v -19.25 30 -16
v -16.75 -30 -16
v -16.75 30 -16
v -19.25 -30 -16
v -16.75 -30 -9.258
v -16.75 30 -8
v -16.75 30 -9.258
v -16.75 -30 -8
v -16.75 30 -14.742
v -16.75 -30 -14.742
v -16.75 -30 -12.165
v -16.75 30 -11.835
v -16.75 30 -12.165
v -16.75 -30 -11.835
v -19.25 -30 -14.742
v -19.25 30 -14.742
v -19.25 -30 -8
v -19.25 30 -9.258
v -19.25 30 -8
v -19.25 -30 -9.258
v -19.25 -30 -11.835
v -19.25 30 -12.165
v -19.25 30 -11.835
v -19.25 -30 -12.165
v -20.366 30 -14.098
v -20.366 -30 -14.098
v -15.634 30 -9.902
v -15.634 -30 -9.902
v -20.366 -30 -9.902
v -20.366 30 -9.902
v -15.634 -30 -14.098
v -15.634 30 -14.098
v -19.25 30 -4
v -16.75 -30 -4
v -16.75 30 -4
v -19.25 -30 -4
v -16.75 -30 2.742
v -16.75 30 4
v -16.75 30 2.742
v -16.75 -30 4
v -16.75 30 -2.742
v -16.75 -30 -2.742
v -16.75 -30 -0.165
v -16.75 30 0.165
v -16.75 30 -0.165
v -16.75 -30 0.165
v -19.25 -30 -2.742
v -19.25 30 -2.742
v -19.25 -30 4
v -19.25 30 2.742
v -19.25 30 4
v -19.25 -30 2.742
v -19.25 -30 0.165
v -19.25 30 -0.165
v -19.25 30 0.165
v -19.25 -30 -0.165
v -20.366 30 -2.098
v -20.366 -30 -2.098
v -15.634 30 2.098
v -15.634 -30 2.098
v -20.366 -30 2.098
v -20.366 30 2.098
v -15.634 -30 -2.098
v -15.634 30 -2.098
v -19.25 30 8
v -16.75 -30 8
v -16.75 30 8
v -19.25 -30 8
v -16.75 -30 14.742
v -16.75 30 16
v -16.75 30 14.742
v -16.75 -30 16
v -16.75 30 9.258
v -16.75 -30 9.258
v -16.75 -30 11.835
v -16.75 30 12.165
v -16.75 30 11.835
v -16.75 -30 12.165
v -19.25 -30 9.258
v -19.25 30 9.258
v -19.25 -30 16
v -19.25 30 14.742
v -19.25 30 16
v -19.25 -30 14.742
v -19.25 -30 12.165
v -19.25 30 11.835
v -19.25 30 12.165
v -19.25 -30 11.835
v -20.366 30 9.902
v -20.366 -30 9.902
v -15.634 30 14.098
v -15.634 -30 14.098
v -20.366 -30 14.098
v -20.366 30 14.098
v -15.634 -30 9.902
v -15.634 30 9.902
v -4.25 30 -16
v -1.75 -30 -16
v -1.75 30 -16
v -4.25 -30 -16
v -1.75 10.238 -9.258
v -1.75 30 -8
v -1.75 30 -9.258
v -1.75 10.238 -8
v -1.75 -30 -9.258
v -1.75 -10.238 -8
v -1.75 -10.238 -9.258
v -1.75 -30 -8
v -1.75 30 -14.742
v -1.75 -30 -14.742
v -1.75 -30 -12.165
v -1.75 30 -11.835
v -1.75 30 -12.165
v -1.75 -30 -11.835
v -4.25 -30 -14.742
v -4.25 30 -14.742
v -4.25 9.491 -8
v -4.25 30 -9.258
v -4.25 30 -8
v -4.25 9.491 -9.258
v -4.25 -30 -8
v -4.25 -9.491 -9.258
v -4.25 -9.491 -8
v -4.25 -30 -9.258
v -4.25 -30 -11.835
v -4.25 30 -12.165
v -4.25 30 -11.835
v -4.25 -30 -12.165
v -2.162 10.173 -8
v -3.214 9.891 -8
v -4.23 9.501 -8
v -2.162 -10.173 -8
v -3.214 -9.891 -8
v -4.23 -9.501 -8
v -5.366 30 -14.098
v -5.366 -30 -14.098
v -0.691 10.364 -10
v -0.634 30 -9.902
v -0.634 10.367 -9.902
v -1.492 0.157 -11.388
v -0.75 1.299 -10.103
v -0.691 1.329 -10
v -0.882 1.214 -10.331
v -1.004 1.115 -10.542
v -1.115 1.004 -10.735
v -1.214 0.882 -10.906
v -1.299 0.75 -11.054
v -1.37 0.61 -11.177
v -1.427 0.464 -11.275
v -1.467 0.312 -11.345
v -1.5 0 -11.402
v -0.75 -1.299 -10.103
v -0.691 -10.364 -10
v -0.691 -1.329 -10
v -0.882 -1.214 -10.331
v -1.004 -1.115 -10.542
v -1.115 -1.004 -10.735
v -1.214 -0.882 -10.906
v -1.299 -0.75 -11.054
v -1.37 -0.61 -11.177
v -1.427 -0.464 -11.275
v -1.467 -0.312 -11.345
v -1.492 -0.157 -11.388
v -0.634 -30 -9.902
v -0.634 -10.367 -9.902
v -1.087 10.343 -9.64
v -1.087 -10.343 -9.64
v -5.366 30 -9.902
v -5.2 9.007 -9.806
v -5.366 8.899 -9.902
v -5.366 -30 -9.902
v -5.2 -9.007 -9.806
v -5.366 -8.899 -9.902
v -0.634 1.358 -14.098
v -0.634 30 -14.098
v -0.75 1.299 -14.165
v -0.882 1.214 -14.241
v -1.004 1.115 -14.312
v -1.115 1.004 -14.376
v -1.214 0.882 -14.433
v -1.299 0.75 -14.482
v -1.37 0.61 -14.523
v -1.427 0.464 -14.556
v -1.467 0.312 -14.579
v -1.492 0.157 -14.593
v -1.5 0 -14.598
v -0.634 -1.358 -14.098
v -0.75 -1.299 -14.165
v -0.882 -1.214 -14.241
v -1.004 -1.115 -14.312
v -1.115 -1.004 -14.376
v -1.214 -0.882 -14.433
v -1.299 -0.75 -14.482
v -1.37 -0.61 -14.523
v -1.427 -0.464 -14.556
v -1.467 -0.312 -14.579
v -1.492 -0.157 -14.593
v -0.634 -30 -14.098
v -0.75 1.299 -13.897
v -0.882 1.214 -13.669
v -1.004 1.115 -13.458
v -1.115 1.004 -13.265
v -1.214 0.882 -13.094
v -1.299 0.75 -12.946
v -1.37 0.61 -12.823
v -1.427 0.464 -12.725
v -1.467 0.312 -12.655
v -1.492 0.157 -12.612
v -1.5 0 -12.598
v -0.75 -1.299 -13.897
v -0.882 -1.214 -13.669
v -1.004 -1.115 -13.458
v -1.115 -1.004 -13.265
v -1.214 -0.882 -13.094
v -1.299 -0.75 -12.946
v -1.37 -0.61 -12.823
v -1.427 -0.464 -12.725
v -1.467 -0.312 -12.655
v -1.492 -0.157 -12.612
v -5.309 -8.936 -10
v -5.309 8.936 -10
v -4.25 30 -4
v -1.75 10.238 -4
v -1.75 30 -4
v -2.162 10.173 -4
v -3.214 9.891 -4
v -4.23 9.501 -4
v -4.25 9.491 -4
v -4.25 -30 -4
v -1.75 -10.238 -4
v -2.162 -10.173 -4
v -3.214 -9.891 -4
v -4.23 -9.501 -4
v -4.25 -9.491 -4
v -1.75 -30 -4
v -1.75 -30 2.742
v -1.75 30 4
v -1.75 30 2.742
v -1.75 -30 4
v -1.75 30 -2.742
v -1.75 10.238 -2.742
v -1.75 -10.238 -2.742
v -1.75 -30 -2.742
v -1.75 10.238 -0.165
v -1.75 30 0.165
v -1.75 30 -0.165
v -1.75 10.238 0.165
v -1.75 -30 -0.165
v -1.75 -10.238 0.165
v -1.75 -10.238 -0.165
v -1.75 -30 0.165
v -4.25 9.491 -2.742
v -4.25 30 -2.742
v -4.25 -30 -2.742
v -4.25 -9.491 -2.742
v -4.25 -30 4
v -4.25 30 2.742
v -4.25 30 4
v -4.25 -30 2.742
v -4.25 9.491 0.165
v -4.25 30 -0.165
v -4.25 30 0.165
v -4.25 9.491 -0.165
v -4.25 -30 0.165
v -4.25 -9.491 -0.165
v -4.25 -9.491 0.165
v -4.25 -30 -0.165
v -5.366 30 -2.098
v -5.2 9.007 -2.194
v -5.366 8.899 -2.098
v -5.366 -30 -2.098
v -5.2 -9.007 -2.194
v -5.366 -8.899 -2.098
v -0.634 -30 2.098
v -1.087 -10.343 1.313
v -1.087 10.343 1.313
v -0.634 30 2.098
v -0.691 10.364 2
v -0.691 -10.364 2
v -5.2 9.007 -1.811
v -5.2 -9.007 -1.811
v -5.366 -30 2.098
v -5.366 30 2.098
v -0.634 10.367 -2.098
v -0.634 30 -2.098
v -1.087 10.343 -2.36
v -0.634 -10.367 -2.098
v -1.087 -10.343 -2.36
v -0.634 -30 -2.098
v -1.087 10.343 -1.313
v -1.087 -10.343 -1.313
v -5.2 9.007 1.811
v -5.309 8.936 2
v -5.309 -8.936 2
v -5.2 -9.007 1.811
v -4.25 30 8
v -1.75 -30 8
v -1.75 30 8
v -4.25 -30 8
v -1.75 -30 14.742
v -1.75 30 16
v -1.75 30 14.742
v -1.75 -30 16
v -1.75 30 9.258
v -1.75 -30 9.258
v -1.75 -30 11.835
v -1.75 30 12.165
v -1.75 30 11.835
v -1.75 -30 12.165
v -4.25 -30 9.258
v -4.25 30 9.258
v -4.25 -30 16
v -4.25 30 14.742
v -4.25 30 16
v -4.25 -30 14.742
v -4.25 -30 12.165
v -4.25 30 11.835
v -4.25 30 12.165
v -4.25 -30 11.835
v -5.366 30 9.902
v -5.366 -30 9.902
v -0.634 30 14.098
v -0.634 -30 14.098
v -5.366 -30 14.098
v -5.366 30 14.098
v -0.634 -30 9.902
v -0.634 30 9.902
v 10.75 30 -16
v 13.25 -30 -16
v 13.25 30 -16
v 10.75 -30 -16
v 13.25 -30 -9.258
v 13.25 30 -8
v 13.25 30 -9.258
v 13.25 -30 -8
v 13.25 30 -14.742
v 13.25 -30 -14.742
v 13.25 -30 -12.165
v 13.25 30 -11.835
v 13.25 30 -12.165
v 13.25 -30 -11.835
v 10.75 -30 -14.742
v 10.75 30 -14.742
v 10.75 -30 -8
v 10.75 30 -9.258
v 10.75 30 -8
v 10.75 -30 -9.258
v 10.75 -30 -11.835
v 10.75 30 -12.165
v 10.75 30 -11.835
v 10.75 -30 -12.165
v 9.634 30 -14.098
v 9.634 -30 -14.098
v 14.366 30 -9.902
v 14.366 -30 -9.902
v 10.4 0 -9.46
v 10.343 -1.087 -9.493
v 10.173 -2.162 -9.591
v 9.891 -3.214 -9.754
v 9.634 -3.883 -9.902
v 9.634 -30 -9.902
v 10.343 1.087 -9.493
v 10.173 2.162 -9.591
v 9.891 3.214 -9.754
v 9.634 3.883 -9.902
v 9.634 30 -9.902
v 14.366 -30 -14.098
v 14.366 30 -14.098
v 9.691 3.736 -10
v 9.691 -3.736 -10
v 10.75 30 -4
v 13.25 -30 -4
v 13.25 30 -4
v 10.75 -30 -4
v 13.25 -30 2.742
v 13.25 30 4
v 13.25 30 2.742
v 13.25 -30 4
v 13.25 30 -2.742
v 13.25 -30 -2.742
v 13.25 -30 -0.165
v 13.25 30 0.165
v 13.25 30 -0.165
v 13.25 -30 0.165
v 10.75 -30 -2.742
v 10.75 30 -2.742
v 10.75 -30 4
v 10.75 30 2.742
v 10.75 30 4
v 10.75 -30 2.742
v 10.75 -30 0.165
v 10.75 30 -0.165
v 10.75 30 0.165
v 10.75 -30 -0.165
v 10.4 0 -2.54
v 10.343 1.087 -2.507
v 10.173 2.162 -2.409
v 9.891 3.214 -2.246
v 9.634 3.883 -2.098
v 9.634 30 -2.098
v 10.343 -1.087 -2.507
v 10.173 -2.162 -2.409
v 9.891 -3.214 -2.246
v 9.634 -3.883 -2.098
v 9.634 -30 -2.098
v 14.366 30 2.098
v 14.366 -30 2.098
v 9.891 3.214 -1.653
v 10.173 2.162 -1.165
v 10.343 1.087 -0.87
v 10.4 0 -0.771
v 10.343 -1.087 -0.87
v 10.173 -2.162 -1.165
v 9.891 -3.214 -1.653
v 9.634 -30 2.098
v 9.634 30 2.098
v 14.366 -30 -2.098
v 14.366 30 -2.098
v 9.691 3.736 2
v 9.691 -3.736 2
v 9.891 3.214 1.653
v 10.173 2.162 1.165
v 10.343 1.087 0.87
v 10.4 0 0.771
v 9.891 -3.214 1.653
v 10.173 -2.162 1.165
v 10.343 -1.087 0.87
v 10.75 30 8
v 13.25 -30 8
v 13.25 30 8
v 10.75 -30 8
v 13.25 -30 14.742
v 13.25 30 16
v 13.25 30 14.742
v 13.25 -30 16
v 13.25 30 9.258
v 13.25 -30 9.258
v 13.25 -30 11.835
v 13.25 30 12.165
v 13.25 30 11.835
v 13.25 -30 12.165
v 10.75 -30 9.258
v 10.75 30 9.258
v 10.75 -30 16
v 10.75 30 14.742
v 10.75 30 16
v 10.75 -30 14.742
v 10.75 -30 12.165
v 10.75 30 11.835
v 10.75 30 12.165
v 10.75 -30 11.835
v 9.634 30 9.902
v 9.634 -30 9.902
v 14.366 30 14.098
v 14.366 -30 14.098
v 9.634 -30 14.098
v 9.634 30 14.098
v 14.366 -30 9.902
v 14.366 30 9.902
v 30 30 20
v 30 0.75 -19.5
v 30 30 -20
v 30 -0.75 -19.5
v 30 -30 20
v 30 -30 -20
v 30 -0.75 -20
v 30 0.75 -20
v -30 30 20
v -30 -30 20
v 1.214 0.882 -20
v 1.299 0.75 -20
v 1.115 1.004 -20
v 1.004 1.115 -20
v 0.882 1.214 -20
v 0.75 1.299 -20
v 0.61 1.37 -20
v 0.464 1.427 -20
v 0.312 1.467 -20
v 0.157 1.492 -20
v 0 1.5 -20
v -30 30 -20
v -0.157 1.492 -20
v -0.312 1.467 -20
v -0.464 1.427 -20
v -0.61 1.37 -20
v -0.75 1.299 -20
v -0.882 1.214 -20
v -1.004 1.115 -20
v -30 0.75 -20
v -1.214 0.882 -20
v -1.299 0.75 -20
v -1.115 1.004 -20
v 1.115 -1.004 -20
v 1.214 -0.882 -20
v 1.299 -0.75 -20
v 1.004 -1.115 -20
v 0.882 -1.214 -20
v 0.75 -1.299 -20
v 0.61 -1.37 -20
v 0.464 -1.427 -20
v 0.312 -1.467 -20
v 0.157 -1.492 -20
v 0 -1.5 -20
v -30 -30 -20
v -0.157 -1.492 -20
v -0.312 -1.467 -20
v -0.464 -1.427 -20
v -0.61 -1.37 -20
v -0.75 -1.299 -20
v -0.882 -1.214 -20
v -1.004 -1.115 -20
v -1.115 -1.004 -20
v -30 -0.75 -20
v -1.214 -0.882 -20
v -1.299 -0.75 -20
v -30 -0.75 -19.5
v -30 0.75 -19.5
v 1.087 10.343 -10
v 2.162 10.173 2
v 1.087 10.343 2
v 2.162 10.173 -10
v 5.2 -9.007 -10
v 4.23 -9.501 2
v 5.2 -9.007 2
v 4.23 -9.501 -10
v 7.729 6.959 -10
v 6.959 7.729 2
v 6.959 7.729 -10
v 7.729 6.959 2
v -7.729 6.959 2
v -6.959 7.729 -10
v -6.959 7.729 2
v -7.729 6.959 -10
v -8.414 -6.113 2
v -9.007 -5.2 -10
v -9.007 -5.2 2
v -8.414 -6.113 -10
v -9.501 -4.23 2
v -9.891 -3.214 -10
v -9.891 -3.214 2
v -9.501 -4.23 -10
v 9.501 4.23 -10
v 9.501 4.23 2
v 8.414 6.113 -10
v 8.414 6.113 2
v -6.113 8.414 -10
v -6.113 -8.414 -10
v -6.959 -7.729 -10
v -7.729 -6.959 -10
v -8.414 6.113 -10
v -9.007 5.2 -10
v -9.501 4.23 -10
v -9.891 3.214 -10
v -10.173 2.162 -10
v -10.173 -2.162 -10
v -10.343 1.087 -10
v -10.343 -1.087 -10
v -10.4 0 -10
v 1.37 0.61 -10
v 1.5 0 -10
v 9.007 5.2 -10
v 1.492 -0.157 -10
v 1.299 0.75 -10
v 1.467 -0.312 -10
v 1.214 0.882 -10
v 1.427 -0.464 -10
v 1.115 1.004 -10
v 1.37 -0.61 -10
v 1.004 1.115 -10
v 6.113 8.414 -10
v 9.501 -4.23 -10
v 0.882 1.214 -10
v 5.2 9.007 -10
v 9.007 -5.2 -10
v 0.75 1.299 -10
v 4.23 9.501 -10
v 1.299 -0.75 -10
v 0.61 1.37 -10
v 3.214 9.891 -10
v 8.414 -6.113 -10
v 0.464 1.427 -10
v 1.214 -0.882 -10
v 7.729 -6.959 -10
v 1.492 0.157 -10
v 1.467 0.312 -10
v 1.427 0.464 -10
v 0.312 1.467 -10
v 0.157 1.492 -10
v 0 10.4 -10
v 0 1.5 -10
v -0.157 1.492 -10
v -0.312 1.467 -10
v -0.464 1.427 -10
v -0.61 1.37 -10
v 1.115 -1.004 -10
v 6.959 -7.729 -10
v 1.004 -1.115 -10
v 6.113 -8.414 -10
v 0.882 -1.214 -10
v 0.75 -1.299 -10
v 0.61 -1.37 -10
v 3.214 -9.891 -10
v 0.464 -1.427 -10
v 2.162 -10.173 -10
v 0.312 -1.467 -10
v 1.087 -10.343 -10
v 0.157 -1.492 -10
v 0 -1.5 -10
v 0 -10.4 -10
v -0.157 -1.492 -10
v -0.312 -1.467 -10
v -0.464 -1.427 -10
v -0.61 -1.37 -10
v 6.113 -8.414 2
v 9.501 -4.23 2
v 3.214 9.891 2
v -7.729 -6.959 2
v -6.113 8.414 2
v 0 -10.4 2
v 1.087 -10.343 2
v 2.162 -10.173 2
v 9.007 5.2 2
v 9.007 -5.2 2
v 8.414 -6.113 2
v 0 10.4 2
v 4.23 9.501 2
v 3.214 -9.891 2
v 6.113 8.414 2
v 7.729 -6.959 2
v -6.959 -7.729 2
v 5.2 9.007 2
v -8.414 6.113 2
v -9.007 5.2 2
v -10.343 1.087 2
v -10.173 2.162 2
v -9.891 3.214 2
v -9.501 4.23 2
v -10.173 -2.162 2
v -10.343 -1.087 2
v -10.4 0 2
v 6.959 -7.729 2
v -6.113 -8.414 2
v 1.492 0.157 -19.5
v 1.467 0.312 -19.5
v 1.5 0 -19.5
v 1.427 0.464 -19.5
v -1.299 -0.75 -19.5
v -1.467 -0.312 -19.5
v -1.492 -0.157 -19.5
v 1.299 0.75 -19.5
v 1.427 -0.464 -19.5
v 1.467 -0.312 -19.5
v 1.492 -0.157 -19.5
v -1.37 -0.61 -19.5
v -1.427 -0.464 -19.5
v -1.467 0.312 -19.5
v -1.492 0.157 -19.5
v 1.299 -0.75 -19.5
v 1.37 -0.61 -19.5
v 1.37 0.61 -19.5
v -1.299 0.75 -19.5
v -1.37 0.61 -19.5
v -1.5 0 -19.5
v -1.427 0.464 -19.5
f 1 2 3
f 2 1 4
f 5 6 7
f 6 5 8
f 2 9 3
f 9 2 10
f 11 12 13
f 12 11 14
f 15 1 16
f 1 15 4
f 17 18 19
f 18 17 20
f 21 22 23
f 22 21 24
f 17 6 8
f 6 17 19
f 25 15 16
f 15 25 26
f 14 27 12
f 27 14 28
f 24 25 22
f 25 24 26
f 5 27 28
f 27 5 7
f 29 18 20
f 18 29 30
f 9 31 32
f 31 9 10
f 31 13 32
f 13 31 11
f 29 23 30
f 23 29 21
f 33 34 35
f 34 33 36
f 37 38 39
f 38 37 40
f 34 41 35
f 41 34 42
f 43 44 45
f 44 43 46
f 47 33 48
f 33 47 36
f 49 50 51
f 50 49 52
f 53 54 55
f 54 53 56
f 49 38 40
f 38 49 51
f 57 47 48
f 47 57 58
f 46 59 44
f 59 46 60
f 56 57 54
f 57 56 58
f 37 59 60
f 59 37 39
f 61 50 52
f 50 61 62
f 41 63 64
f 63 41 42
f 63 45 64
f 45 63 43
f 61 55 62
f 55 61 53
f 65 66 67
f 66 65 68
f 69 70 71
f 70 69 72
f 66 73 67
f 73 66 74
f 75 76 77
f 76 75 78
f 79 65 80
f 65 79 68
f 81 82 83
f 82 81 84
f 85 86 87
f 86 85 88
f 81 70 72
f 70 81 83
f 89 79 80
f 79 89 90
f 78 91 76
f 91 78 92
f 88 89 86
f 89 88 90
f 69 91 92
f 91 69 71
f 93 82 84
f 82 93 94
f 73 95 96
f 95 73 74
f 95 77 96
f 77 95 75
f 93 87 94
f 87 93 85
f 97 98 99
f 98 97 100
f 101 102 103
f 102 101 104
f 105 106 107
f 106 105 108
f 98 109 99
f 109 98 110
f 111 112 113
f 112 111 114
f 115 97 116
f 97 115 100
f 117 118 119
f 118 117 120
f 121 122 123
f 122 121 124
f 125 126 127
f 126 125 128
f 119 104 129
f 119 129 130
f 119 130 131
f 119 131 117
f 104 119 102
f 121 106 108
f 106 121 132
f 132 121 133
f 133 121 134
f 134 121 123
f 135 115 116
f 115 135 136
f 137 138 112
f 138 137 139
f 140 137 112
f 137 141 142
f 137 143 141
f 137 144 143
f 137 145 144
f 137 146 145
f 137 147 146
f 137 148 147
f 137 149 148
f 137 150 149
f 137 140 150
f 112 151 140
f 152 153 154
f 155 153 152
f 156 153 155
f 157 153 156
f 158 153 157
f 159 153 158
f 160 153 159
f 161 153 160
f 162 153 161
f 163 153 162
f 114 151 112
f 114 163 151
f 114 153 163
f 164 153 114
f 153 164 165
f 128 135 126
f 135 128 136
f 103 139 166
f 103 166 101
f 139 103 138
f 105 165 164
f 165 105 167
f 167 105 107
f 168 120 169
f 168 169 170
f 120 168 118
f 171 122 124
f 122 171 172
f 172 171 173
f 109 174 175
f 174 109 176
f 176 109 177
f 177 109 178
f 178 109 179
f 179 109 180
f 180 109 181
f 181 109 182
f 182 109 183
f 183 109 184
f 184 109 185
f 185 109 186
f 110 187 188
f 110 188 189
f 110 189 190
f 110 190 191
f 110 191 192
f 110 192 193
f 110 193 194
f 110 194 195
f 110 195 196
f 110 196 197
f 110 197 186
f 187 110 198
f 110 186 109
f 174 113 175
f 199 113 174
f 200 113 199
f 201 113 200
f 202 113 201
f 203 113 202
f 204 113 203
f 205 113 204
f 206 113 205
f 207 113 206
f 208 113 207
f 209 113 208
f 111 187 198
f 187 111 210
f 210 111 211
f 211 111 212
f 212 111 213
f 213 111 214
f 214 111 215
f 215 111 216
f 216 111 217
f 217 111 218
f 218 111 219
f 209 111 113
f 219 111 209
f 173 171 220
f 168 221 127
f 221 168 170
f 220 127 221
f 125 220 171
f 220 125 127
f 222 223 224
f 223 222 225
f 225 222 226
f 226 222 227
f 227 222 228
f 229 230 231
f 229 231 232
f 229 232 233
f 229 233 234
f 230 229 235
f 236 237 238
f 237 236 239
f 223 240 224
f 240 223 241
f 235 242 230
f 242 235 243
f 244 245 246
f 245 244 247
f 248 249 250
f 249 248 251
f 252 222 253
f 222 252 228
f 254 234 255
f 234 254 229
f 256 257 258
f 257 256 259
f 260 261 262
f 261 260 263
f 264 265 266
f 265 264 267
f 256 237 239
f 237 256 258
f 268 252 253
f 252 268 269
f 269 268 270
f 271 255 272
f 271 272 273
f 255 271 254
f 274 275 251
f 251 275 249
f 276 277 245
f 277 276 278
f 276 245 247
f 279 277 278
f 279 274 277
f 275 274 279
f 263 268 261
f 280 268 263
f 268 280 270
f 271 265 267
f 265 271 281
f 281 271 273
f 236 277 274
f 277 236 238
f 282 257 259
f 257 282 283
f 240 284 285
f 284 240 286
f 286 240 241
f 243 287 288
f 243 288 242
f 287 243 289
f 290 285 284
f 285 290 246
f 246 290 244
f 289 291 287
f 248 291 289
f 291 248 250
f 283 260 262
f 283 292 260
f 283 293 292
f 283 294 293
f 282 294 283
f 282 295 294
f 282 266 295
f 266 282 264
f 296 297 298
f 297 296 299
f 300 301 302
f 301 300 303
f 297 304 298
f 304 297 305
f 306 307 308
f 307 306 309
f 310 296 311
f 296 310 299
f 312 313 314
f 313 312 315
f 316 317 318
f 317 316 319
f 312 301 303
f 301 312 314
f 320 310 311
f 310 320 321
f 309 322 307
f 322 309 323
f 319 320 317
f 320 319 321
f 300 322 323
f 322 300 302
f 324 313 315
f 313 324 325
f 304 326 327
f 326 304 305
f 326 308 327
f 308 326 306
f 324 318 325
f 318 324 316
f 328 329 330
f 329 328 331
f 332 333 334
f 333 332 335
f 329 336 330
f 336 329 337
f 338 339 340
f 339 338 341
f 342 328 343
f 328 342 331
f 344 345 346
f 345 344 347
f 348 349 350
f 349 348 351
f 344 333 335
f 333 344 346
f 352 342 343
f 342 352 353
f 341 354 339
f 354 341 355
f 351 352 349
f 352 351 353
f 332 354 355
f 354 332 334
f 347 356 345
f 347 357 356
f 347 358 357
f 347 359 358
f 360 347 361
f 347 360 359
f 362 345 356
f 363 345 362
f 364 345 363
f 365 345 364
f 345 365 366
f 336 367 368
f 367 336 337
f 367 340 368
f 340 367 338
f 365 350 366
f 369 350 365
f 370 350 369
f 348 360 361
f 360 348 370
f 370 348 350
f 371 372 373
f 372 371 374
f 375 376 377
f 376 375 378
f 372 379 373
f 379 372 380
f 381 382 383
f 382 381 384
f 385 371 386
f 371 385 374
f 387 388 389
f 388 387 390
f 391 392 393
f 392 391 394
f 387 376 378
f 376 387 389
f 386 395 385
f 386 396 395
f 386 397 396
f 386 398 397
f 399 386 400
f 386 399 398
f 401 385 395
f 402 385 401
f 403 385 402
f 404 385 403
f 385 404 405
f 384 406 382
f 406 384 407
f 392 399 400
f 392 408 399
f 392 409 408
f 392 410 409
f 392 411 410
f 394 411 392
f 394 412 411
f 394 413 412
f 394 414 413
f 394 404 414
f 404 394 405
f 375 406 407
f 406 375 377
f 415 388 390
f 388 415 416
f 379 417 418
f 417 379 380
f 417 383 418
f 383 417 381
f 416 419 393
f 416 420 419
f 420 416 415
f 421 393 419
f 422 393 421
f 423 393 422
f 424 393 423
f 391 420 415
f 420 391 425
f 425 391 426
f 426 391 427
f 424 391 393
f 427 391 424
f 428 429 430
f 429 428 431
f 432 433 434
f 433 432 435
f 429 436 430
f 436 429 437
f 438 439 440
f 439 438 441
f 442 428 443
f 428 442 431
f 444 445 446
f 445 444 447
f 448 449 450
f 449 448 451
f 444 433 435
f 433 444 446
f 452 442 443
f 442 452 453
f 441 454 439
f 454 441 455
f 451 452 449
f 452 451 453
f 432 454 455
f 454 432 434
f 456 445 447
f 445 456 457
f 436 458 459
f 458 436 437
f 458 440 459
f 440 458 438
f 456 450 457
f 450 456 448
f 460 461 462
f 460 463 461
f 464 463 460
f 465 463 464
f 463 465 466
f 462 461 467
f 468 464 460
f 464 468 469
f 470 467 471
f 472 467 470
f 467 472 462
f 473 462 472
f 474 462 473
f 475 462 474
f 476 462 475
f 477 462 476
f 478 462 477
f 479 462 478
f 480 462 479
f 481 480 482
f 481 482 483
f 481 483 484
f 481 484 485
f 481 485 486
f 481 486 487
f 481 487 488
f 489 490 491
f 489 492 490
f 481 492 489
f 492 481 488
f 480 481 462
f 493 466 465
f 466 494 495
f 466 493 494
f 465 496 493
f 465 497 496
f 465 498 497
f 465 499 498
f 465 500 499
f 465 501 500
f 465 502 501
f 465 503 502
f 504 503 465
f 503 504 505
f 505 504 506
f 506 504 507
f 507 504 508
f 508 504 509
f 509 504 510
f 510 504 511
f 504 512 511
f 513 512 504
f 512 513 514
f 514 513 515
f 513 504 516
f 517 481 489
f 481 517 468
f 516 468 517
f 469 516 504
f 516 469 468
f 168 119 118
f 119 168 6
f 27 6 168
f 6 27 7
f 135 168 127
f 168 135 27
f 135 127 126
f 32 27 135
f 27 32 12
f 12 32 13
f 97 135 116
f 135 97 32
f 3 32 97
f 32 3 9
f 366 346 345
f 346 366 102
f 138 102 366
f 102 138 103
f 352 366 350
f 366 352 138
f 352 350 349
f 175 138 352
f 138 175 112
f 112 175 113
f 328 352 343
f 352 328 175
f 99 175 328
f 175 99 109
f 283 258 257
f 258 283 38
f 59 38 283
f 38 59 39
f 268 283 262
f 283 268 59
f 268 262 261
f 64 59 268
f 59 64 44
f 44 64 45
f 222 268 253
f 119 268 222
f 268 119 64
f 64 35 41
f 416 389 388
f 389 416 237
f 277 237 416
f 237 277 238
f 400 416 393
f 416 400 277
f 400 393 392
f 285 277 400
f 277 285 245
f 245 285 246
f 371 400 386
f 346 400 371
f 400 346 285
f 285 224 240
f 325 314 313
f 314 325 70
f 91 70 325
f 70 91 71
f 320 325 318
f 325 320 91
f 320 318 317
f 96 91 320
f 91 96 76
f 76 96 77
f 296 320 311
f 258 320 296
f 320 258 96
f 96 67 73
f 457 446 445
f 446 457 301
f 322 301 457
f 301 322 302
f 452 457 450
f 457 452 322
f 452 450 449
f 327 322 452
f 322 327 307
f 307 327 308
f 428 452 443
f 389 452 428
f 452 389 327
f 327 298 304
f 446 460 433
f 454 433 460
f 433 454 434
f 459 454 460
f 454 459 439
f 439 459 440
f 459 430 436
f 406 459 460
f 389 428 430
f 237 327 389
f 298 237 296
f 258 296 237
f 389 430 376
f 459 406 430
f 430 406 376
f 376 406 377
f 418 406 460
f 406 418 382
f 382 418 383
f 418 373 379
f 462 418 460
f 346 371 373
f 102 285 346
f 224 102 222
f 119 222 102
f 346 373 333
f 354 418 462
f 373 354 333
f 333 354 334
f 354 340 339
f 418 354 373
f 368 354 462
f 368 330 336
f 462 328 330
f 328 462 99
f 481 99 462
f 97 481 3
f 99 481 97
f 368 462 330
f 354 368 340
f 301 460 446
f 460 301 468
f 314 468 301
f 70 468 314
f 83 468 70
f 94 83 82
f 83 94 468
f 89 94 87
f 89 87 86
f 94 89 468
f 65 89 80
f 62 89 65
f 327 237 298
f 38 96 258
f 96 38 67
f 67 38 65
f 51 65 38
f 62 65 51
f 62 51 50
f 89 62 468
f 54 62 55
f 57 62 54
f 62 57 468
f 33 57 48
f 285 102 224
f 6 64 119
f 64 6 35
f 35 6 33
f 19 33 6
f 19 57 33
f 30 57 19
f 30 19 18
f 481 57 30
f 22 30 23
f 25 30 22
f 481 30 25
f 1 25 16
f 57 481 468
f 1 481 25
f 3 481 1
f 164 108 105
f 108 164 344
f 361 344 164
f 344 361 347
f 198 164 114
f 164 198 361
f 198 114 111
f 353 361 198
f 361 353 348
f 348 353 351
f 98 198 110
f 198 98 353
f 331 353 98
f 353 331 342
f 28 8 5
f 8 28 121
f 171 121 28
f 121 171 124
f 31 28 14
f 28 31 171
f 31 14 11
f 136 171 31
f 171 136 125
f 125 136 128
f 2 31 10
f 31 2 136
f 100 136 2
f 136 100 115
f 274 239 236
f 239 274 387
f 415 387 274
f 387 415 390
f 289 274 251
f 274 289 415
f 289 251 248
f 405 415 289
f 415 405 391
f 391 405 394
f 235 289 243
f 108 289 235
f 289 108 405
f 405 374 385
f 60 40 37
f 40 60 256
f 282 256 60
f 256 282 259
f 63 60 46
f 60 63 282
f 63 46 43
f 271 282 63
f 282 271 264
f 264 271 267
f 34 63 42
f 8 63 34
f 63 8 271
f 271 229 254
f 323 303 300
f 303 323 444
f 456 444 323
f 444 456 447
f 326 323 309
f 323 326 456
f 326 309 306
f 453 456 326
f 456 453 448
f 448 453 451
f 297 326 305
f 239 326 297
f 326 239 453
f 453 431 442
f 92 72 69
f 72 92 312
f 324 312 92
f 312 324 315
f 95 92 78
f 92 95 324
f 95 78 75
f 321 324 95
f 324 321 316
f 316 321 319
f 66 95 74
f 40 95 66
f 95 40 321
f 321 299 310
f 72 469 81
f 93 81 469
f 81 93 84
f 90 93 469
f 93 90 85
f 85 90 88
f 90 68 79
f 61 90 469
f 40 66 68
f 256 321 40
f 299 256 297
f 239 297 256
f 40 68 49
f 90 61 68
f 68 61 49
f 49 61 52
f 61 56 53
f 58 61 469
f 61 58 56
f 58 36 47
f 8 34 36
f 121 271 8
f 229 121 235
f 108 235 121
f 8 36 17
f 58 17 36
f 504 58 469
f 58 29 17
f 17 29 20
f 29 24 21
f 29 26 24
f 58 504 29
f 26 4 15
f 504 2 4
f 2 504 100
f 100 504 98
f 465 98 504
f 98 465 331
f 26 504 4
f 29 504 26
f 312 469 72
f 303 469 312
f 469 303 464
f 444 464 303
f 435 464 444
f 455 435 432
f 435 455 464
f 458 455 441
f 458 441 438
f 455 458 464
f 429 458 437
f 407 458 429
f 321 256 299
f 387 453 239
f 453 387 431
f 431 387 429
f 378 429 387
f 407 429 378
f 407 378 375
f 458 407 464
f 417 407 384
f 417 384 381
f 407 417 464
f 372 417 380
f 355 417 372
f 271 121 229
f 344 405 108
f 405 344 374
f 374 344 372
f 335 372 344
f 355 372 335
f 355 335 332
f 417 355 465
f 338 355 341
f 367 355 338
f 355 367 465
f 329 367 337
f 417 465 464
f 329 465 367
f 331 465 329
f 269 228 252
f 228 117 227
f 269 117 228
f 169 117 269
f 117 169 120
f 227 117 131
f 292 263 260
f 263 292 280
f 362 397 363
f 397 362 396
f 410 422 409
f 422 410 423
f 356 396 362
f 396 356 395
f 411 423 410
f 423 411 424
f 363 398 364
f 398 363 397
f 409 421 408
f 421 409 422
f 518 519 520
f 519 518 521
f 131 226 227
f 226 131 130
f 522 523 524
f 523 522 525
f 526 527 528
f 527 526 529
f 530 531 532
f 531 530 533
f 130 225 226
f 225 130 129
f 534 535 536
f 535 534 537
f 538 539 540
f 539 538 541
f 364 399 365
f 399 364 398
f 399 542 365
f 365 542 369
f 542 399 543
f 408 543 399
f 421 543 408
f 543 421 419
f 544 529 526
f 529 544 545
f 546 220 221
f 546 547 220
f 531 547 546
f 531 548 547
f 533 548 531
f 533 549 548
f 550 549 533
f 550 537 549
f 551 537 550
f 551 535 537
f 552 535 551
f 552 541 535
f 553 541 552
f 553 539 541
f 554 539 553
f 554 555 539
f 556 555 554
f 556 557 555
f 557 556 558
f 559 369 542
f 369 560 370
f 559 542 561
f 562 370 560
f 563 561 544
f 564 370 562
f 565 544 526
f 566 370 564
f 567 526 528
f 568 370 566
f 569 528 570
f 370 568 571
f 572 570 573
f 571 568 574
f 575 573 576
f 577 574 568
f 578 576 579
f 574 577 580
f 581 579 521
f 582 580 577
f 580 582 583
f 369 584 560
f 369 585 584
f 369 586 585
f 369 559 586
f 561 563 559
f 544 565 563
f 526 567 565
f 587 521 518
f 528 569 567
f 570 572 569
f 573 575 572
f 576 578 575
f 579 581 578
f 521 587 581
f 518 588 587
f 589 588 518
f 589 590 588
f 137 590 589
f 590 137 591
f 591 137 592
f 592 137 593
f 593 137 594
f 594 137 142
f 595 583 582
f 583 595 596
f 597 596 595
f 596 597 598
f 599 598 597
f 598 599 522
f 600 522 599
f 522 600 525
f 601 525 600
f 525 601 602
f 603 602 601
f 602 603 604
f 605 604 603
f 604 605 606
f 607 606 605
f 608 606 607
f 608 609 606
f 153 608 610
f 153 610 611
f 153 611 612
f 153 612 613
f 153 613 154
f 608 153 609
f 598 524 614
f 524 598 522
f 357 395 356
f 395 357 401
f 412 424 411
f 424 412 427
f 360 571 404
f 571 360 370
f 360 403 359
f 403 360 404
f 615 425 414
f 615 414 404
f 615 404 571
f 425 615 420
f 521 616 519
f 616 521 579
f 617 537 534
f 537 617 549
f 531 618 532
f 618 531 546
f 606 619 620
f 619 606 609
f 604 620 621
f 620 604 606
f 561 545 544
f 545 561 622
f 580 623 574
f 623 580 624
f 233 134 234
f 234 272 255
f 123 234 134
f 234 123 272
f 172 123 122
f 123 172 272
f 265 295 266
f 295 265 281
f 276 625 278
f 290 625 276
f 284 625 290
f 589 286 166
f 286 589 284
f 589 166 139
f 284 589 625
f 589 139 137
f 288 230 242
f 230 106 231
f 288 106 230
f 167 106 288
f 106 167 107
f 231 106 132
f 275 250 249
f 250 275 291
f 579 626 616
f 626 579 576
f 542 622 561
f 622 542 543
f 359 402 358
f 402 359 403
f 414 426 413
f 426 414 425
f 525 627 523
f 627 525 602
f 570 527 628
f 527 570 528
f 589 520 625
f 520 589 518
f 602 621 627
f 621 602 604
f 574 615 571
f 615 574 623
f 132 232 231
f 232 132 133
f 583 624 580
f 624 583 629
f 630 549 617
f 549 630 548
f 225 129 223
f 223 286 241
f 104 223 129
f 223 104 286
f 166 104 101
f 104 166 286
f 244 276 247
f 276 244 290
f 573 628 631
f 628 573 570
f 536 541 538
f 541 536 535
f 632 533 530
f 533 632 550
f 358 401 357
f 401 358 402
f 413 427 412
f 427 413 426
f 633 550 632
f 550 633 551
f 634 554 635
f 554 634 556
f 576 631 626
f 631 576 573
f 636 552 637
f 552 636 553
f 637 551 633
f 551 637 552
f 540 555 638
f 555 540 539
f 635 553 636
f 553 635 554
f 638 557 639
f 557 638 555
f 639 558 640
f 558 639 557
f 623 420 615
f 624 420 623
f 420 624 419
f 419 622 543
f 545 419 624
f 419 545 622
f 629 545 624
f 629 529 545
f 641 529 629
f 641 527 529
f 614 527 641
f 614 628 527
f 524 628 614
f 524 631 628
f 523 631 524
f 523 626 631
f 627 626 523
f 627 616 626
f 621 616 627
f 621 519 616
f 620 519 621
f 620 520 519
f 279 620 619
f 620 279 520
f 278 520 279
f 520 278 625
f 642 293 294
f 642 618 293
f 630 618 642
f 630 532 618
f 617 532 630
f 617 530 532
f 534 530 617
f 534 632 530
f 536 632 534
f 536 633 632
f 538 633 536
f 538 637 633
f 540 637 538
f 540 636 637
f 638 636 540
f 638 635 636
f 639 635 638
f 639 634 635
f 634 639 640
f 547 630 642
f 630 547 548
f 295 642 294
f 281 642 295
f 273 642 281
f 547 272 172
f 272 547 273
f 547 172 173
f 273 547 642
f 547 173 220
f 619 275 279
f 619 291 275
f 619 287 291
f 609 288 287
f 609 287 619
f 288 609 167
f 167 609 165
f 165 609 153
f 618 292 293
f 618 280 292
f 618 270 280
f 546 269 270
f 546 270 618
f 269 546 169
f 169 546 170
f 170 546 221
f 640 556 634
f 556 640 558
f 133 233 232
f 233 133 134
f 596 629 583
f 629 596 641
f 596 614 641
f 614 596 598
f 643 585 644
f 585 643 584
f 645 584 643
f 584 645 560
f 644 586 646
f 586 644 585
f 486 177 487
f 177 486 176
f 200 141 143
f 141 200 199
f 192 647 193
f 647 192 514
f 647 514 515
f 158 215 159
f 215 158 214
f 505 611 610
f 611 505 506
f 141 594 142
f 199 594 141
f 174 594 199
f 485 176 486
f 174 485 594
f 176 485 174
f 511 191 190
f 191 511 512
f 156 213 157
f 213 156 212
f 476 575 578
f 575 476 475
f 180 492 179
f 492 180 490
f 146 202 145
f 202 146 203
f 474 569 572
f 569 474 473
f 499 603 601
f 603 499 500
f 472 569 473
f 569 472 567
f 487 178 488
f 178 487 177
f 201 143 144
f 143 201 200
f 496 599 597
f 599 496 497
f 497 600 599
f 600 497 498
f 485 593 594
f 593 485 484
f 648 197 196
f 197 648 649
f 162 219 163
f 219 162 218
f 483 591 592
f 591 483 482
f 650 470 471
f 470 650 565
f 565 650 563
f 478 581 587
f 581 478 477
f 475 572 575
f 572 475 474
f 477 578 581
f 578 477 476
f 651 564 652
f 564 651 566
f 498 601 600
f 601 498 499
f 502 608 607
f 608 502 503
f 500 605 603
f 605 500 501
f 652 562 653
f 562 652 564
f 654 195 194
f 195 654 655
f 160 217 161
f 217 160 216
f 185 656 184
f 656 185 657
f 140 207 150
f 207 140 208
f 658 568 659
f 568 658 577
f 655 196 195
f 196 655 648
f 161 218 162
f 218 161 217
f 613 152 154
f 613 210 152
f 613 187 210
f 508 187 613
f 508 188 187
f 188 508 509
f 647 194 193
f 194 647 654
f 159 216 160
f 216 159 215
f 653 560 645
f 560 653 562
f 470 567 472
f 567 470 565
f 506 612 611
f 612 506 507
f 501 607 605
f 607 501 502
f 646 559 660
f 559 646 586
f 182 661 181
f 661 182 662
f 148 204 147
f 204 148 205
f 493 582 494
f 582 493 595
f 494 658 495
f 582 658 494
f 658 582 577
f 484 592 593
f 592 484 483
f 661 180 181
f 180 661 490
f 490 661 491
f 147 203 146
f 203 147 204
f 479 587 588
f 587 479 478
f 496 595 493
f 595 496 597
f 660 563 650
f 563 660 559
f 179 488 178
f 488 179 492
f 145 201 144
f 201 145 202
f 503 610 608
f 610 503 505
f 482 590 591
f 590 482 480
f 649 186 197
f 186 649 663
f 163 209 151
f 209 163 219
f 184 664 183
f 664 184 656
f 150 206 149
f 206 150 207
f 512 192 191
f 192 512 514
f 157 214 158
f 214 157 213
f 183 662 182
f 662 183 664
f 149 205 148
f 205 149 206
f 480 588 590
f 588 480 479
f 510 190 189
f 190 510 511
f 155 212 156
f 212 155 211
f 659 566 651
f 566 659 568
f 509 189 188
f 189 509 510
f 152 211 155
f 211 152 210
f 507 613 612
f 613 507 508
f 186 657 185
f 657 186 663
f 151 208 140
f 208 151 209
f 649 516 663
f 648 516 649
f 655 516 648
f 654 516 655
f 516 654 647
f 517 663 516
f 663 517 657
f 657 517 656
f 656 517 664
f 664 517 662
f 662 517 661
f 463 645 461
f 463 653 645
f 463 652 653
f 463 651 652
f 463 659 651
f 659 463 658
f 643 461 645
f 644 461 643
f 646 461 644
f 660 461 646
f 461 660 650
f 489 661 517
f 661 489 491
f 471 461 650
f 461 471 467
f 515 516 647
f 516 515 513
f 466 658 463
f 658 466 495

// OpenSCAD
// Matrix Biomimetic Utilities - Parametric Industrial Auxetic Vibration Harvester
// Version 1.0.0-Facility Core | Scale-Invariant Energy Harvesting Mount

// ============================================================================
// 🏛️ MASTER COMPONENT MATRIX (Tailored for heavy automated line conveyor motors)
// ============================================================================
MOUNT_WIDTH = 60.0;        // Total square profile outer boundary footprint (mm)
TOTAL_MOUNT_H = 40.0;      // Total vertical compression thickness (mm)
PIEZO_BAY_DIAMETER = 20.5; // Precision cavity pocket for 20mm ceramic harvesting discs (mm)

// ============================================================================
// 📐 RECONCILIATION MATRICES (Compensates for 1.8% Polypropylene Contraction)
// ============================================================================
WALL_THICKNESS = 3.0;
CORE_RADIUS = (PIEZO_BAY_DIAMETER / 2) + 0.15; // 0.15mm clearance ensures flush press-fit seating

$fn = 60; // Curvature factor optimized for industrial high-pressure load handling

module MKX_Auxetic_Vibration_Harvester() {
    difference() {
        union() {
            // 1. PRIMARY INDUSTRIAL STRUCTURAL HOUSING (Printed in Matte Black Recycled ASA)
            cube([MOUNT_WIDTH, MOUNT_WIDTH, TOTAL_MOUNT_H], center=true);
        }
        
        // 2. THE MASTER BIOMIMETIC AUXETIC MATRIX SUBTRACTION
        // Carves out an interlocking web of negative Poisson re-entrant honeycomb cells.
        // This causes the mount to contract and expand uniformly to fully isolate machine shocks.
        for (x_step = [-MOUNT_WIDTH*0.3 : 15 : MOUNT_WIDTH*0.3]) {
            for (z_step = [-TOTAL_MOUNT_H*0.3 : 12 : TOTAL_MOUNT_H*0.3]) {
                translate([x_step, 0, z_step])
                    rotate([0, 90, 0])
                        Auxetic_Reentrant_Cell();
            }
        }
        
        // 3. INTERNAL PIEZOELECTRIC HARVESTING COMPRESSION BAY
        // Concentrates the vertical kinetic hammer stroke directly onto the ceramic harvesting core
        translate([0, 0, -TOTAL_MOUNT_H * 0.1])
            cylinder(h=12.0, r=CORE_RADIUS, center=true);
            
        // 4. LOWER SOLID-STATE SIGNAL WIRING PASSAGE
        // Internal 3mm path channels harvested voltage out to the diagnostic sensor grid cleanly
        translate([0, 0, -TOTAL_MOUNT_H * 0.4])
            cylinder(h=TOTAL_MOUNT_H * 0.3, r=1.5, center=true);
            
        // 5. MUNICIPAL MICRO-VENTILATION OUTGAS GROOVES
        // 0.5mm bottom slits allow styrene gases to vent safely, preventing bed warping plate splits
        translate([0, 0, (-TOTAL_MOUNT_H / 2) + 0.25])
            cube([MOUNT_WIDTH + 2, 1.5, 0.5], center=true);
    }
}

module Auxetic_Reentrant_Cell() {
    // Generates a single scale-invariant re-entrant arrowhead geometry segment
    union() {
        cube([8.0, MOUNT_WIDTH + 2, 2.5], center=true);
        rotate([0, 30, 0]) cube([6.0, MOUNT_WIDTH + 2, 2.0], center=true);
        rotate([0, -30, 0]) cube([6.0, MOUNT_WIDTH + 2, 2.0], center=true);
    }
}

MKX_Auxetic_Vibration_Harvester();
